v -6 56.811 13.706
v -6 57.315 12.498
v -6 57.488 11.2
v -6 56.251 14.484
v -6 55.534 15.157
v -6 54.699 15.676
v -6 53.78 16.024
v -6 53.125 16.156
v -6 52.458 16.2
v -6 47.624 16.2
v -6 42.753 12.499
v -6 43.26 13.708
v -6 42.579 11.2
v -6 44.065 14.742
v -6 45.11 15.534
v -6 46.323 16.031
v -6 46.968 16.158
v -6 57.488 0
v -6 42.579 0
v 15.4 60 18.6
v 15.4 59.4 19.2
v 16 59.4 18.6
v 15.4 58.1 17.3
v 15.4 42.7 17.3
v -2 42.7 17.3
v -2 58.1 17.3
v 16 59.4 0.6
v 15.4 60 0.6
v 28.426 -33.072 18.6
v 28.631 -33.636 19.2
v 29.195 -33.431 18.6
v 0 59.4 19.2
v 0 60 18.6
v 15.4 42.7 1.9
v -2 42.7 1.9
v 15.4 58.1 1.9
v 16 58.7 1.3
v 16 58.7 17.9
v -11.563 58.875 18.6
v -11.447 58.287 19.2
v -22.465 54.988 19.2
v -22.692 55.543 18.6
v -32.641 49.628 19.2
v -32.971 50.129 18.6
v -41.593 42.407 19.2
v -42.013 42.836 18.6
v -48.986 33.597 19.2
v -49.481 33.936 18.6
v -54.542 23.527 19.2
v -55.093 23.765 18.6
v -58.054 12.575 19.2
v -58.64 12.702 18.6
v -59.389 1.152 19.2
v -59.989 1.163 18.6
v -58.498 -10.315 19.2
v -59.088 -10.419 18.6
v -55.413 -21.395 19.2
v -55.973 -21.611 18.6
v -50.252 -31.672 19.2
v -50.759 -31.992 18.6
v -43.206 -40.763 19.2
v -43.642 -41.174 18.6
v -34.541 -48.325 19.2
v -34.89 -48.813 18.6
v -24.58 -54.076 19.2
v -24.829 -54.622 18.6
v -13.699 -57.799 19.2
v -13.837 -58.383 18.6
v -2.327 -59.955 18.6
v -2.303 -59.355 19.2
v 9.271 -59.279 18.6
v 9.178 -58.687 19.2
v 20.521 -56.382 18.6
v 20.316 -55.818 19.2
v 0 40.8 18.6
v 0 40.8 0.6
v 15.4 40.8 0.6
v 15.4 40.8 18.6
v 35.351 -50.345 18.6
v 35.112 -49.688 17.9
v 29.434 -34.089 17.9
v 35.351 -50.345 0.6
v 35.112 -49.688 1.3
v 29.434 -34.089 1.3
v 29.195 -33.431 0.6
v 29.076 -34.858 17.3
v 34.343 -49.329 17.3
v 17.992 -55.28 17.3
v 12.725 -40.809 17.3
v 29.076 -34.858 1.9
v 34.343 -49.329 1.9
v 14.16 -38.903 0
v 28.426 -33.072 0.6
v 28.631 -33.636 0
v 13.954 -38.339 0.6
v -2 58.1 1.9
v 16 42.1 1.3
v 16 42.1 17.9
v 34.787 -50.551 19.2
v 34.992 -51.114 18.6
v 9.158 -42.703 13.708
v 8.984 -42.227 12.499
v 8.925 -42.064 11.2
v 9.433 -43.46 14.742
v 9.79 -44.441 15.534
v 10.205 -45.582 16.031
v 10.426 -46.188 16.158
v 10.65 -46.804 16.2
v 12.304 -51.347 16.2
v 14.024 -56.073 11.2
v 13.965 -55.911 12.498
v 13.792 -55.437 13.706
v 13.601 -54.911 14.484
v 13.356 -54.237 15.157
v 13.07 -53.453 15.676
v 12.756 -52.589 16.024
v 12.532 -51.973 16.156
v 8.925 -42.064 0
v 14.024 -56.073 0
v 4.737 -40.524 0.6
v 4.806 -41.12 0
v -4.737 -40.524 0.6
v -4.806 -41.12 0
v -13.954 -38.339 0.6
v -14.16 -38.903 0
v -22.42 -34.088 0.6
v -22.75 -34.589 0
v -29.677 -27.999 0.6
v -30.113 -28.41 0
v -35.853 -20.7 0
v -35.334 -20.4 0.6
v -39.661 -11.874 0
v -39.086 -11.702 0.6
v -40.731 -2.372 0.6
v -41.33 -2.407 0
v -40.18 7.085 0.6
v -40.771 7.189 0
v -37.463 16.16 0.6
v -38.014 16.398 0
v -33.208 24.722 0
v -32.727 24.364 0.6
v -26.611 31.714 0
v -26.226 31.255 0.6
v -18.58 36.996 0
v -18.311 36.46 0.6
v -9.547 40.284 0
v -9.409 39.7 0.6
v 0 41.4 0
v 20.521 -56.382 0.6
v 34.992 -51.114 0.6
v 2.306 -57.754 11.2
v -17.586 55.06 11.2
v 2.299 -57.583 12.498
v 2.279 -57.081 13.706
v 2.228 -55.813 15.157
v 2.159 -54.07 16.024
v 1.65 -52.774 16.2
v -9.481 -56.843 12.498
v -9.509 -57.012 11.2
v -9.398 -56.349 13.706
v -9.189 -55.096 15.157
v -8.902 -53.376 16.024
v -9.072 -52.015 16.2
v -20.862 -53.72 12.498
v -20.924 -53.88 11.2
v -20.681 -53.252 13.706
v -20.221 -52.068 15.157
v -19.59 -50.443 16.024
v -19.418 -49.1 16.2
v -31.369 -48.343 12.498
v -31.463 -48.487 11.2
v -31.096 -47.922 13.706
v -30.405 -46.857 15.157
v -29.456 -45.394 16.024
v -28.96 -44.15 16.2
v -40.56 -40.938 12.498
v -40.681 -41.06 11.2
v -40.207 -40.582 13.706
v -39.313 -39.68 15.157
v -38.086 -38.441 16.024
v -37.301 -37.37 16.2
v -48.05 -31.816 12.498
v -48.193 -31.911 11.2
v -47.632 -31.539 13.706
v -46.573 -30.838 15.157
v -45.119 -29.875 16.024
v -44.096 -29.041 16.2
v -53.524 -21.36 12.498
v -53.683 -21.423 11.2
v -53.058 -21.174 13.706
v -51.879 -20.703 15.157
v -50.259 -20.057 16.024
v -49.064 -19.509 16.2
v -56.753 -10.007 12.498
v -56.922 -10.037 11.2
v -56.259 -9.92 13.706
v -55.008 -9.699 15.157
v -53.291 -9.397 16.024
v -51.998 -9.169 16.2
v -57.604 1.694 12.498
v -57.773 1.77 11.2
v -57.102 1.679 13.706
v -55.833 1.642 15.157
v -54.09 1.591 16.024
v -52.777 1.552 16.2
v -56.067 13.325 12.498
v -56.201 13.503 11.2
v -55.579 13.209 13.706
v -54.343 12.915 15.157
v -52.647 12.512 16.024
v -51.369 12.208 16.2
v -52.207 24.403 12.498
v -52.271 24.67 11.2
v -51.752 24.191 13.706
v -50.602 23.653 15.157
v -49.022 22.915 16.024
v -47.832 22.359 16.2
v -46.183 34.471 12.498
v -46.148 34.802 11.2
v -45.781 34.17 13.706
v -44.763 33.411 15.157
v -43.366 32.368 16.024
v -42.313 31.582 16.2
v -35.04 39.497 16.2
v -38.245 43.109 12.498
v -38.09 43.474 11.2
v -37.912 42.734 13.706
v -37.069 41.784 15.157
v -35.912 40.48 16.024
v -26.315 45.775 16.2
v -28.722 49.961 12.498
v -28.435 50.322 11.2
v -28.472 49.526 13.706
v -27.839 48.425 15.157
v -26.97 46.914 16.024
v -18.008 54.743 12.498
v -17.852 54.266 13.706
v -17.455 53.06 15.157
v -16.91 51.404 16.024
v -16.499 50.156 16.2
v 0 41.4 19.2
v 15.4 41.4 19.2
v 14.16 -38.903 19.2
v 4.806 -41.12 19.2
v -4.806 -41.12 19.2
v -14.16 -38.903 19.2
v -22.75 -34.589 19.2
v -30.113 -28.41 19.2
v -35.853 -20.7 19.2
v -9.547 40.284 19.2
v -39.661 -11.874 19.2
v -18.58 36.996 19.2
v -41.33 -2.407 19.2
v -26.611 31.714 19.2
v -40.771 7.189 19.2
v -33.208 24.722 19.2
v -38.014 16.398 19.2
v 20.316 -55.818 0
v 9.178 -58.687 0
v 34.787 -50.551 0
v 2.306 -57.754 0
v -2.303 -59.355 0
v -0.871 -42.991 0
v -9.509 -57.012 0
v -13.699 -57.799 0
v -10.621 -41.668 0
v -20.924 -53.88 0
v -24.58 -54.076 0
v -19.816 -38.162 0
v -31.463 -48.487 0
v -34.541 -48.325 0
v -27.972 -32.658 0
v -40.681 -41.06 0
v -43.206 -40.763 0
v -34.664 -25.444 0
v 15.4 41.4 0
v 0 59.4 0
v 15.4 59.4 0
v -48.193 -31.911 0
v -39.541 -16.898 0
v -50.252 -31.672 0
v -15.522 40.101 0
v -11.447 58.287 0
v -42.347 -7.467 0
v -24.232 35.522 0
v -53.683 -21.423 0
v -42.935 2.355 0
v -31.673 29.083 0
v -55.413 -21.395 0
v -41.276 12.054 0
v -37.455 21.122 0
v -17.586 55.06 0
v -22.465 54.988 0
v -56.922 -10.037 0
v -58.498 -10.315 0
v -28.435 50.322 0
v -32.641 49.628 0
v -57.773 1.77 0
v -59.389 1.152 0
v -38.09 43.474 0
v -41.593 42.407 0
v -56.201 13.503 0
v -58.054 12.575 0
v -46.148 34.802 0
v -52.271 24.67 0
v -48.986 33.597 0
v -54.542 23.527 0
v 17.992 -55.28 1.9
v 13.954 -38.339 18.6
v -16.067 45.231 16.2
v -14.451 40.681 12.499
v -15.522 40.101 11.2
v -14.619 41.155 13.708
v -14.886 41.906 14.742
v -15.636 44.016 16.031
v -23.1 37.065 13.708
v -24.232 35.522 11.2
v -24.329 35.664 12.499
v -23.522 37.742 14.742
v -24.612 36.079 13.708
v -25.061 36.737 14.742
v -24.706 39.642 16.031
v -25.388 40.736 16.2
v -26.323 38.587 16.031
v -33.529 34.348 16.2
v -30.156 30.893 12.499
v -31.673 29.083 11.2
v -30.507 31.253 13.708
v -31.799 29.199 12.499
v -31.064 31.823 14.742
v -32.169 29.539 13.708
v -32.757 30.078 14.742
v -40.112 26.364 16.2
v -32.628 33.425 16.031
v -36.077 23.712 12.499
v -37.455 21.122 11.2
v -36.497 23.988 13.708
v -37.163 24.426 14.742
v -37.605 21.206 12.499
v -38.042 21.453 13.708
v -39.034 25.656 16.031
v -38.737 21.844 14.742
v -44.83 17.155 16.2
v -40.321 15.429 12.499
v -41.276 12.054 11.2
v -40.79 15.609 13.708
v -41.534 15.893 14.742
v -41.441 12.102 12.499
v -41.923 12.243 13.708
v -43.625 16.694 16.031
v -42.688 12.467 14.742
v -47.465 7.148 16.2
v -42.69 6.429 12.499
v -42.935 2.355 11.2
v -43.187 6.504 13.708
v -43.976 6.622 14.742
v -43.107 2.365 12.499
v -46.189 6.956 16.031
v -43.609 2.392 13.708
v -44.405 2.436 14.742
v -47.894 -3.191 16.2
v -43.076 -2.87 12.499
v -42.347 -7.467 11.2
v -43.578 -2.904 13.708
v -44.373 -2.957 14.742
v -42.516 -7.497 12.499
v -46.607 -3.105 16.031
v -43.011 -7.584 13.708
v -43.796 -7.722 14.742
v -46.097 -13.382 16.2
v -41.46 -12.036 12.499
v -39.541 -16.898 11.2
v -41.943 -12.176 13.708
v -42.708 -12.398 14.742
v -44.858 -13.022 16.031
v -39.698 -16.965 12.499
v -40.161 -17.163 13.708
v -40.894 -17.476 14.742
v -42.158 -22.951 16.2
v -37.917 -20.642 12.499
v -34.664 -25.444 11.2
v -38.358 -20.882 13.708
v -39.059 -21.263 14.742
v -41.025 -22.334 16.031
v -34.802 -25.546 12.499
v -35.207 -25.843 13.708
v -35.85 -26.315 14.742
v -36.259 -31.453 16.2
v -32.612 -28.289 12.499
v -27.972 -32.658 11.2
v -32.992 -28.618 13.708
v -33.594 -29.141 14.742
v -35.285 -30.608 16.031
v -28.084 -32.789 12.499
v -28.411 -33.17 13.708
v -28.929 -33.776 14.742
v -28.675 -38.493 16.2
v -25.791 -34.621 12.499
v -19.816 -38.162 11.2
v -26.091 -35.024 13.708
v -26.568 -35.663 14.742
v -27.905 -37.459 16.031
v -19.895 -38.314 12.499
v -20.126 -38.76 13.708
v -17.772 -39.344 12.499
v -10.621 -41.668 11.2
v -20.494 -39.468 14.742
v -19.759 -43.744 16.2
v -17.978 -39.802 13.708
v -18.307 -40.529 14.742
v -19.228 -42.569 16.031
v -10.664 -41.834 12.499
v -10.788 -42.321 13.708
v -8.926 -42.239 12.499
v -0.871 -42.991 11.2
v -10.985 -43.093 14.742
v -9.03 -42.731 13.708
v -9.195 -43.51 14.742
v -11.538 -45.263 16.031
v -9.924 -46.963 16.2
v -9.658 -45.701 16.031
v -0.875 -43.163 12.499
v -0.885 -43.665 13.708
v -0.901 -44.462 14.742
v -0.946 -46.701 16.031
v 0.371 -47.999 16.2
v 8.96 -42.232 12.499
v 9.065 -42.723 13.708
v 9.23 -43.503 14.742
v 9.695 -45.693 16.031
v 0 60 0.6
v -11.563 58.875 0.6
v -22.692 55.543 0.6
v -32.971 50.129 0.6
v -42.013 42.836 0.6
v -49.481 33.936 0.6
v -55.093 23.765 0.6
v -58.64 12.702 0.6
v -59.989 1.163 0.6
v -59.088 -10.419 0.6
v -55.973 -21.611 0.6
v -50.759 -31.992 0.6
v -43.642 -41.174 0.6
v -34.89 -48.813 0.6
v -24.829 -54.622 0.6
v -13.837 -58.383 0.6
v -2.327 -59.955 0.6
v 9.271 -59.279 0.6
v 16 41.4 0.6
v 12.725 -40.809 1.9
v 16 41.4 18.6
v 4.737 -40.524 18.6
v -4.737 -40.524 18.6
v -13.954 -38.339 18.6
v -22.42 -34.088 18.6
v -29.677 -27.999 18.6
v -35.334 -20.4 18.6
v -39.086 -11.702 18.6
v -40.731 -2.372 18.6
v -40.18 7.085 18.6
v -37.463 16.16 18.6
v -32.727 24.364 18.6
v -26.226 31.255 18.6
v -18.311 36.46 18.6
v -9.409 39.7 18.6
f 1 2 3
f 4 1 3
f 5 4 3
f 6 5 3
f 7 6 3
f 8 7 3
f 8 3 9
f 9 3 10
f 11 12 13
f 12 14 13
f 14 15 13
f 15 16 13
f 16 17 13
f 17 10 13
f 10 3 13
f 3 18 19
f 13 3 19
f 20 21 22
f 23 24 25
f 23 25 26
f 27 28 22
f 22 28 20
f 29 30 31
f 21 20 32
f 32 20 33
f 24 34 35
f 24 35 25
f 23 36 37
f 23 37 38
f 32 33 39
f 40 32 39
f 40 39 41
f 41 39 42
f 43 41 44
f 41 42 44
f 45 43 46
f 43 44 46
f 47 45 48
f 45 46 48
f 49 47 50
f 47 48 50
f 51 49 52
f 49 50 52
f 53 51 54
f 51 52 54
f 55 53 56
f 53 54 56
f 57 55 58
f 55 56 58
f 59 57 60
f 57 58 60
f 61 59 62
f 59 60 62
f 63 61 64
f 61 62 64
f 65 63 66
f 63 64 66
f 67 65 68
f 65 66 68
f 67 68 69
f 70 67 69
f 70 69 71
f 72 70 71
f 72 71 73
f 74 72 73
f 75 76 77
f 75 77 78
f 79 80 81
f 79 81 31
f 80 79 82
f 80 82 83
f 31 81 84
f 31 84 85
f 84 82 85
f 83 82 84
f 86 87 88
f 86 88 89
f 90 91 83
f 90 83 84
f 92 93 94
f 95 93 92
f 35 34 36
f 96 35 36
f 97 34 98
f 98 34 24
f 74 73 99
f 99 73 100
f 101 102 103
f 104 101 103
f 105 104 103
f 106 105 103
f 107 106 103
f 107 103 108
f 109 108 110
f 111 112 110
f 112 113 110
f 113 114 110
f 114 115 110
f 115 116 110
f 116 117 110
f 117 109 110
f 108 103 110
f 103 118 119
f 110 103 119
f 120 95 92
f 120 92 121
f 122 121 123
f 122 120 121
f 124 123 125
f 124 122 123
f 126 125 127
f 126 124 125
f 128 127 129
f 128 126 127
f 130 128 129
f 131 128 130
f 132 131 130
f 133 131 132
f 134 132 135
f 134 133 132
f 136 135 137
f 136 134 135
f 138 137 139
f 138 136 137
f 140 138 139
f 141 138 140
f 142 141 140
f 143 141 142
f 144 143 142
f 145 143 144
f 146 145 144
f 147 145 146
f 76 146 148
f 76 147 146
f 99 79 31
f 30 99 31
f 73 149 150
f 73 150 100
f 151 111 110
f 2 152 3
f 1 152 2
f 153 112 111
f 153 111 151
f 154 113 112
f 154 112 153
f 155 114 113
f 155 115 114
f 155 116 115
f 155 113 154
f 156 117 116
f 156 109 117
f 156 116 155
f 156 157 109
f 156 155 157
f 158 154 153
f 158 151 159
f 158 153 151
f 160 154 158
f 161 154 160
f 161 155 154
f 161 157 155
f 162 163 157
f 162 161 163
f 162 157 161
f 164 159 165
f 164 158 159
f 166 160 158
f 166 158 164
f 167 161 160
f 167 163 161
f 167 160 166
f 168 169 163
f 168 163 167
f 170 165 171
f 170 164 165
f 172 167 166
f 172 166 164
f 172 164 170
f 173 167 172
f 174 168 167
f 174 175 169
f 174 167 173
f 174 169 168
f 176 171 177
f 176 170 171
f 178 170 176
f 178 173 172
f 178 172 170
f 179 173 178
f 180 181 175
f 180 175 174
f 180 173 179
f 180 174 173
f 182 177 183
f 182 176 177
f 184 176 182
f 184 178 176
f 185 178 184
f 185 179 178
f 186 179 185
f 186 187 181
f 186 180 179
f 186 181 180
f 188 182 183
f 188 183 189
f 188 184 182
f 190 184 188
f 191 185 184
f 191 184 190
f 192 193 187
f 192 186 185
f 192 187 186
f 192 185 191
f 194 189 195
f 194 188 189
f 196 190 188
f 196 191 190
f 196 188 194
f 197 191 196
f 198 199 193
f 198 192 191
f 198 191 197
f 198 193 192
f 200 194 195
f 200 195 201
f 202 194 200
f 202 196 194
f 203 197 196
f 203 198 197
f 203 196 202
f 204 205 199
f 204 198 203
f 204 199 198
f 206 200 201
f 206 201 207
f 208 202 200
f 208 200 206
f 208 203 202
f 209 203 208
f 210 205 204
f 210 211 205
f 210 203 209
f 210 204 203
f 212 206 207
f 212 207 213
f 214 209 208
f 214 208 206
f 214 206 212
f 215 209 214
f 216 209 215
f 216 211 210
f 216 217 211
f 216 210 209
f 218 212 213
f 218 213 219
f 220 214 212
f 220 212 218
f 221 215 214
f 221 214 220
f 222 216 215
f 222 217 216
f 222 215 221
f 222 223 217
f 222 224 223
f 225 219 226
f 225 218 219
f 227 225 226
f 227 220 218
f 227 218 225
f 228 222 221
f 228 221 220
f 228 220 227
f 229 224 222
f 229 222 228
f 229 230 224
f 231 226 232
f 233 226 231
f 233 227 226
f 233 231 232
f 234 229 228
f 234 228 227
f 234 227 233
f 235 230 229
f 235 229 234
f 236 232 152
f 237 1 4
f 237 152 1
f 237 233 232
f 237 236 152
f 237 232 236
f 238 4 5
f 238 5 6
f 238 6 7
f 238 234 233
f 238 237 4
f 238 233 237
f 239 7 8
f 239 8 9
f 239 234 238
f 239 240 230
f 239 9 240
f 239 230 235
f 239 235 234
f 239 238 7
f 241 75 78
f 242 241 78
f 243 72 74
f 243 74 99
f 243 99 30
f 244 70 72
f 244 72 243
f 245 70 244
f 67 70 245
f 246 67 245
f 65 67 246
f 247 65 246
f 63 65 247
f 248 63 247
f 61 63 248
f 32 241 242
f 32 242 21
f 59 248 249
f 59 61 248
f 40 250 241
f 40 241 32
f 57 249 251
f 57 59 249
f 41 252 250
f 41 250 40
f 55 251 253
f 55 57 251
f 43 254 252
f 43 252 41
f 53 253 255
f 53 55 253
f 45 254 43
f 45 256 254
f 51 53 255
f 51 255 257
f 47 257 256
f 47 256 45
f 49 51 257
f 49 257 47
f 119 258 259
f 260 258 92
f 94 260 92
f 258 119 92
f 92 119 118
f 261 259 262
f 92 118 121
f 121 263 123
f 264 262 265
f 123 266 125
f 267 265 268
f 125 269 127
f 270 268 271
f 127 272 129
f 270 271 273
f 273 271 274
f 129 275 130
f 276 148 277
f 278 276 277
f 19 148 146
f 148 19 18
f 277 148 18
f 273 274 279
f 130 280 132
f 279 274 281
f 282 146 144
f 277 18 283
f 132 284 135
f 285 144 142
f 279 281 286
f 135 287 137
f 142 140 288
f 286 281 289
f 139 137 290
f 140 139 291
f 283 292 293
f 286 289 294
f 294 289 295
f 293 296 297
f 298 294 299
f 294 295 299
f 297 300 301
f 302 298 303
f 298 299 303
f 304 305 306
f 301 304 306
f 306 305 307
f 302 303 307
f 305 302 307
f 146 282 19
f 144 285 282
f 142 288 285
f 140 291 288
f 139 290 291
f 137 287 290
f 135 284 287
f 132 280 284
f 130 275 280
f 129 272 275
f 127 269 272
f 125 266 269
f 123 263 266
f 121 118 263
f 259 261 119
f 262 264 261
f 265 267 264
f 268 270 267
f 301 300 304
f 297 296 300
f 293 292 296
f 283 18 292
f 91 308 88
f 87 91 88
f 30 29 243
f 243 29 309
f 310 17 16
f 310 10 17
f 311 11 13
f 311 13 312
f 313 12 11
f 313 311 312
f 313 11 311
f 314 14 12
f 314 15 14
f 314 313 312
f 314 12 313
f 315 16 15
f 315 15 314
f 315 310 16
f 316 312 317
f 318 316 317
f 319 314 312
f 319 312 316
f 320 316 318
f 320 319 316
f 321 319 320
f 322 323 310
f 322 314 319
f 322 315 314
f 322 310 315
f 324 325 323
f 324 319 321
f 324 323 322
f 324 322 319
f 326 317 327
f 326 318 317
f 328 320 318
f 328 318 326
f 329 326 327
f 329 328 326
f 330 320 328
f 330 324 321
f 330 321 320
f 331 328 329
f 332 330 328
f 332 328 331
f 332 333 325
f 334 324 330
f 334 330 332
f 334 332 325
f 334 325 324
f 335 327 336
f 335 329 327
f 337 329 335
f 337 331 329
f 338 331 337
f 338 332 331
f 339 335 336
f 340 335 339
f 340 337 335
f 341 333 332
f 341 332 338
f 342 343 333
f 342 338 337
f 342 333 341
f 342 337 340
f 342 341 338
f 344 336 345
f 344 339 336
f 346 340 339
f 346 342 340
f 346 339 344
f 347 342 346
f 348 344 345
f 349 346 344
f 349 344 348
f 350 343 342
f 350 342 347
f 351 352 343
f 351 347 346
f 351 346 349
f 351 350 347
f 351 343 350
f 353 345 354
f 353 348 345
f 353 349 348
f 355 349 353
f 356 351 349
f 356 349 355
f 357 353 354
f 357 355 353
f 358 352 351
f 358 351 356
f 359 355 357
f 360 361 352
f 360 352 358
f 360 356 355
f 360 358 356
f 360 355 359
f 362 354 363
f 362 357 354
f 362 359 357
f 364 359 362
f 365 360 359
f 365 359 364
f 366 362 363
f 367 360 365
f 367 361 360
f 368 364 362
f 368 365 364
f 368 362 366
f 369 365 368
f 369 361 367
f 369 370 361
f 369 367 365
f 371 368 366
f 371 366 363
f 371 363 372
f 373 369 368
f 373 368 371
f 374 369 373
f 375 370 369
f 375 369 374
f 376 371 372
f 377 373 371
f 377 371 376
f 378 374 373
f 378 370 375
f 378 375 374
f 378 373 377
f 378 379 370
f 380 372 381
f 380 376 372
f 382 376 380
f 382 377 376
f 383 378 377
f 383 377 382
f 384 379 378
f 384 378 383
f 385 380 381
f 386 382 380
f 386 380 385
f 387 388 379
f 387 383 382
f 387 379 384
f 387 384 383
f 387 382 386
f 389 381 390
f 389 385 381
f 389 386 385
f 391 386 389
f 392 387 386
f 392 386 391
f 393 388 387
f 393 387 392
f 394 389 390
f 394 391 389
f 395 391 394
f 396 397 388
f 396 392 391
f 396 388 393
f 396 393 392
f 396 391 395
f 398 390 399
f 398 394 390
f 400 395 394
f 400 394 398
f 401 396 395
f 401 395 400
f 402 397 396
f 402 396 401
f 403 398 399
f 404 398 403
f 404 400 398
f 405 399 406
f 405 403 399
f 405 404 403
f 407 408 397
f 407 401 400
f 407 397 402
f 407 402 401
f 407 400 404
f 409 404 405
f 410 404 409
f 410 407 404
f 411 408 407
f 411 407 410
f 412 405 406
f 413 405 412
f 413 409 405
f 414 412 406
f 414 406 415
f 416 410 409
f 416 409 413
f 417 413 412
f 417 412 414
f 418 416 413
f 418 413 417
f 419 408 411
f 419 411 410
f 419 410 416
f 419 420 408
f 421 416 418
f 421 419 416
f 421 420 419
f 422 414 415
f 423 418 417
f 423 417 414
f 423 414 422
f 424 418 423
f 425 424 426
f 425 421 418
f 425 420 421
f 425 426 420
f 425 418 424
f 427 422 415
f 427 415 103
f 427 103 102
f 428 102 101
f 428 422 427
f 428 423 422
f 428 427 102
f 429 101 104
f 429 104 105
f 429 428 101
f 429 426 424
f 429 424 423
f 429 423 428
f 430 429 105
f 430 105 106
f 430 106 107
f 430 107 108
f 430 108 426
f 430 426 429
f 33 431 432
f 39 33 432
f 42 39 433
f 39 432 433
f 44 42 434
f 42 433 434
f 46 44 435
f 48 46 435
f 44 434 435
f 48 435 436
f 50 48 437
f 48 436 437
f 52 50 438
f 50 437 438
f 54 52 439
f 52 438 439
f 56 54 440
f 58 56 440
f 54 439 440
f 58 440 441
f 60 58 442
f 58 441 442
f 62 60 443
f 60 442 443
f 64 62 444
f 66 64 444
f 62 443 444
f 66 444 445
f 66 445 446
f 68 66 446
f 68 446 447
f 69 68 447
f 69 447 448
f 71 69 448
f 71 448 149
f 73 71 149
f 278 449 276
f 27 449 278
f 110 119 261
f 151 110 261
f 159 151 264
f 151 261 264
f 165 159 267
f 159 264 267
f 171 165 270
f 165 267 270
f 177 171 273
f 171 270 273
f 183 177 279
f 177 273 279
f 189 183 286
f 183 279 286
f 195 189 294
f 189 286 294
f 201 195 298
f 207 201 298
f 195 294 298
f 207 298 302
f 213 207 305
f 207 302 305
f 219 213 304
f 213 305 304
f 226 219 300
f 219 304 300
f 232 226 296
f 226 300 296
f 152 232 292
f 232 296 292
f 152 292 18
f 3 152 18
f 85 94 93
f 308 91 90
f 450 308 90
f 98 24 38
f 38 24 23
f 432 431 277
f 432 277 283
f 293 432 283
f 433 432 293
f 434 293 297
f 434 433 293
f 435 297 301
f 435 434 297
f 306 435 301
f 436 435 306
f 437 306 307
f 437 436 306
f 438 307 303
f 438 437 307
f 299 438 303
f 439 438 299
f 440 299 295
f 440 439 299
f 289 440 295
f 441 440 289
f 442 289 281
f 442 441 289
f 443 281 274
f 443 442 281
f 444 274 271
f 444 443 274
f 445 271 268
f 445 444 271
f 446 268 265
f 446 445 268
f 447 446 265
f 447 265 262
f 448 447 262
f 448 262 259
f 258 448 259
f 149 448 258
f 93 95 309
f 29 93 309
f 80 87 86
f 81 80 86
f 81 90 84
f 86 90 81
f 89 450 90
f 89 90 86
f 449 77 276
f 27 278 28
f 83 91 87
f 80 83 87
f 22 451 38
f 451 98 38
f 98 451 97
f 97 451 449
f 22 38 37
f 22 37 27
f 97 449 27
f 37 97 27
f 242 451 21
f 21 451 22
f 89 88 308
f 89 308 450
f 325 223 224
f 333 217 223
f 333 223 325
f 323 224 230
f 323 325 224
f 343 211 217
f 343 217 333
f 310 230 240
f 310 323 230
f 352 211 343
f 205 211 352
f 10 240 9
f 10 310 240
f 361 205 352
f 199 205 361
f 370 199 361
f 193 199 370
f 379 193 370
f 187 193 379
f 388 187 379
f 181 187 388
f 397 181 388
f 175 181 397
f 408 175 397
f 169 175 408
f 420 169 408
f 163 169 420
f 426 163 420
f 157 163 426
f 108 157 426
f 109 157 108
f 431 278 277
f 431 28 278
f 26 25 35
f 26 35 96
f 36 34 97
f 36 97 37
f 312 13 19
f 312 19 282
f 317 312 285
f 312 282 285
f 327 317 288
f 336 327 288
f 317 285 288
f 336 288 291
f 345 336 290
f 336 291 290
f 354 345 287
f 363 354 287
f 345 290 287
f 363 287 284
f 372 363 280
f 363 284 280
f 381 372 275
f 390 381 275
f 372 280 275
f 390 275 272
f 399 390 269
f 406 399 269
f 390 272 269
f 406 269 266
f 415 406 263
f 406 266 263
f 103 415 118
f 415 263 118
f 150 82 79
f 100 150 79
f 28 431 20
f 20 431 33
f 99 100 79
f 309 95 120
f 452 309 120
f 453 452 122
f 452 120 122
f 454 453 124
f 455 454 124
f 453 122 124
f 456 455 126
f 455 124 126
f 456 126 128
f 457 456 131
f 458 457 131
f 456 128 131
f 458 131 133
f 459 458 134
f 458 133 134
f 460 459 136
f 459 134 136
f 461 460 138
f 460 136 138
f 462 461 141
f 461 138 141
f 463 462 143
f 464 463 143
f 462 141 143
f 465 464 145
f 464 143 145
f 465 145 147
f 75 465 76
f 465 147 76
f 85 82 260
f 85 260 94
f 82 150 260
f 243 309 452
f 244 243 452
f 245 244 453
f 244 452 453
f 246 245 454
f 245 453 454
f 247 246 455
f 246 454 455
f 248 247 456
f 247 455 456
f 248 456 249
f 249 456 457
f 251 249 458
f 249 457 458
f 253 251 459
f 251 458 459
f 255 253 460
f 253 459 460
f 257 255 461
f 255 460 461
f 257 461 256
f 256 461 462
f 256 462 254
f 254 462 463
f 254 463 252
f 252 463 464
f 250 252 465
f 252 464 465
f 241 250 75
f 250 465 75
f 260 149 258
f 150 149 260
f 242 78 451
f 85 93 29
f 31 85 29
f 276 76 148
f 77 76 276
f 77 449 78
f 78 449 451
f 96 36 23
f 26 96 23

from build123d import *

# Parameters (mm, degrees)
F1_DEPTH  = 19.2
F2_DEPTH  = 16
F3_DEPTH  = 16
F4_W      = 15.4
F4_H      = 15.4
F5_DEPTH  = 18
F6_W      = 15.4
F6_H      = 15.4
F7_DEPTH  = 18
F8_SIZE   = 0.6
F10_DEPTH = 16.2
F11_R     = 5


with BuildPart() as f1:
    # F0 (on Top) → F1 (new body)
    with BuildSketch(Plane.XY):
        with BuildLine():
            Line((0, 40.8), (0, 60))
            ThreePointArc((0, 60), (-59.0884651807, -10.41889066), (20.5212085995, -56.3815572472))
            Line((20.5212085995, -56.3815572472), (13.9544218477, -38.3394589281))
            ThreePointArc((13.9544218477, -38.3394589281), (-40.1801563229, -7.0848456488), (0, 40.8))
        make_face()
    extrude(amount=F1_DEPTH)

    # F2 (add): a face of the model
    f2_faces = [f1.faces().sort_by_distance(p)[0] for p in [
        (0, 50.4, 9.6),
    ]]
    extrude(f2_faces, amount=F2_DEPTH)

    # F3 (add): a face of the model
    f3_faces = [f1.faces().sort_by_distance(p)[0] for p in [
        (17.2378152236, -47.3605080876, 9.6),
    ]]
    extrude(f3_faces, amount=F3_DEPTH)

    # F4 (on face) → F5 (cut)
    with BuildSketch(Plane.YZ.offset(16)):
        with Locations((50.4, 9.6)):
            Rectangle(F4_W, F4_H)
    extrude(amount=-F5_DEPTH, mode=Mode.SUBTRACT)

    # F6 (on face) → F7 (cut)
    with BuildSketch(Plane(origin=(15.0350819326, 5.4723222932, 0), x_dir=(-0.3420201433, 0.9396926208, 0), z_dir=(0.9396926208, 0.3420201433, 0))):
        with Locations((-50.4, 9.6)):
            Rectangle(F6_W, F6_H)
    extrude(amount=-F7_DEPTH, mode=Mode.SUBTRACT)

    # F8
    f8_edges = [f1.edges().sort_by_distance(p)[0] for p in [
        (-40.180156, -7.084846, 19.2),
        (-59.088465, -10.418891, 19.2),
        (-40.180156, -7.084846, 0),
        (-59.088465, -10.418891, 0),
        (16, 40.8, 9.6),
        (16, 50.4, 0),
        (16, 50.4, 19.2),
        (16, 60, 9.6),
        (16, 50.4, 17.3),
        (16, 58.1, 9.6),
        (16, 50.4, 1.9),
        (16, 42.7, 9.6),
        (35.556291, -50.909235, 9.6),
        (32.272897, -41.888186, 0),
        (32.272897, -41.888186, 19.2),
        (28.989504, -32.867137, 9.6),
        (32.272897, -41.888186, 17.3),
        (29.639342, -34.652553, 9.6),
        (32.272897, -41.888186, 1.9),
        (34.906452, -49.123819, 9.6),
    ]]
    chamfer(f8_edges, length=F8_SIZE)

    # F9 (on face) → F10 (cut)
    with BuildSketch(Plane(origin=(0, 0, 0), x_dir=(1, 0, 0), z_dir=(0, 0, -1))):
        with BuildLine():
            Line((8.9248354623, 42.063610306), (14.023808605, 56.0729238779))
            ThreePointArc((14.023808605, 56.0729238779), (-56.9218881241, 10.0368646691), (-6, -57.4877378229))
            Line((-6, -57.4877378229), (-6, -42.5793377121))
            ThreePointArc((-6, -42.5793377121), (-42.3467333795, 7.4668716397), (8.9248354623, 42.063610306))
        make_face()
    extrude(amount=-F10_DEPTH, mode=Mode.SUBTRACT)

    # F11
    f11_edges = [f1.edges().sort_by_distance(p)[0] for p in [
        (-56.921888, -10.036865, 16.2),
        (-42.346733, -7.466872, 16.2),
    ]]
    fillet(f11_edges, radius=F11_R)


solid = f1.part
